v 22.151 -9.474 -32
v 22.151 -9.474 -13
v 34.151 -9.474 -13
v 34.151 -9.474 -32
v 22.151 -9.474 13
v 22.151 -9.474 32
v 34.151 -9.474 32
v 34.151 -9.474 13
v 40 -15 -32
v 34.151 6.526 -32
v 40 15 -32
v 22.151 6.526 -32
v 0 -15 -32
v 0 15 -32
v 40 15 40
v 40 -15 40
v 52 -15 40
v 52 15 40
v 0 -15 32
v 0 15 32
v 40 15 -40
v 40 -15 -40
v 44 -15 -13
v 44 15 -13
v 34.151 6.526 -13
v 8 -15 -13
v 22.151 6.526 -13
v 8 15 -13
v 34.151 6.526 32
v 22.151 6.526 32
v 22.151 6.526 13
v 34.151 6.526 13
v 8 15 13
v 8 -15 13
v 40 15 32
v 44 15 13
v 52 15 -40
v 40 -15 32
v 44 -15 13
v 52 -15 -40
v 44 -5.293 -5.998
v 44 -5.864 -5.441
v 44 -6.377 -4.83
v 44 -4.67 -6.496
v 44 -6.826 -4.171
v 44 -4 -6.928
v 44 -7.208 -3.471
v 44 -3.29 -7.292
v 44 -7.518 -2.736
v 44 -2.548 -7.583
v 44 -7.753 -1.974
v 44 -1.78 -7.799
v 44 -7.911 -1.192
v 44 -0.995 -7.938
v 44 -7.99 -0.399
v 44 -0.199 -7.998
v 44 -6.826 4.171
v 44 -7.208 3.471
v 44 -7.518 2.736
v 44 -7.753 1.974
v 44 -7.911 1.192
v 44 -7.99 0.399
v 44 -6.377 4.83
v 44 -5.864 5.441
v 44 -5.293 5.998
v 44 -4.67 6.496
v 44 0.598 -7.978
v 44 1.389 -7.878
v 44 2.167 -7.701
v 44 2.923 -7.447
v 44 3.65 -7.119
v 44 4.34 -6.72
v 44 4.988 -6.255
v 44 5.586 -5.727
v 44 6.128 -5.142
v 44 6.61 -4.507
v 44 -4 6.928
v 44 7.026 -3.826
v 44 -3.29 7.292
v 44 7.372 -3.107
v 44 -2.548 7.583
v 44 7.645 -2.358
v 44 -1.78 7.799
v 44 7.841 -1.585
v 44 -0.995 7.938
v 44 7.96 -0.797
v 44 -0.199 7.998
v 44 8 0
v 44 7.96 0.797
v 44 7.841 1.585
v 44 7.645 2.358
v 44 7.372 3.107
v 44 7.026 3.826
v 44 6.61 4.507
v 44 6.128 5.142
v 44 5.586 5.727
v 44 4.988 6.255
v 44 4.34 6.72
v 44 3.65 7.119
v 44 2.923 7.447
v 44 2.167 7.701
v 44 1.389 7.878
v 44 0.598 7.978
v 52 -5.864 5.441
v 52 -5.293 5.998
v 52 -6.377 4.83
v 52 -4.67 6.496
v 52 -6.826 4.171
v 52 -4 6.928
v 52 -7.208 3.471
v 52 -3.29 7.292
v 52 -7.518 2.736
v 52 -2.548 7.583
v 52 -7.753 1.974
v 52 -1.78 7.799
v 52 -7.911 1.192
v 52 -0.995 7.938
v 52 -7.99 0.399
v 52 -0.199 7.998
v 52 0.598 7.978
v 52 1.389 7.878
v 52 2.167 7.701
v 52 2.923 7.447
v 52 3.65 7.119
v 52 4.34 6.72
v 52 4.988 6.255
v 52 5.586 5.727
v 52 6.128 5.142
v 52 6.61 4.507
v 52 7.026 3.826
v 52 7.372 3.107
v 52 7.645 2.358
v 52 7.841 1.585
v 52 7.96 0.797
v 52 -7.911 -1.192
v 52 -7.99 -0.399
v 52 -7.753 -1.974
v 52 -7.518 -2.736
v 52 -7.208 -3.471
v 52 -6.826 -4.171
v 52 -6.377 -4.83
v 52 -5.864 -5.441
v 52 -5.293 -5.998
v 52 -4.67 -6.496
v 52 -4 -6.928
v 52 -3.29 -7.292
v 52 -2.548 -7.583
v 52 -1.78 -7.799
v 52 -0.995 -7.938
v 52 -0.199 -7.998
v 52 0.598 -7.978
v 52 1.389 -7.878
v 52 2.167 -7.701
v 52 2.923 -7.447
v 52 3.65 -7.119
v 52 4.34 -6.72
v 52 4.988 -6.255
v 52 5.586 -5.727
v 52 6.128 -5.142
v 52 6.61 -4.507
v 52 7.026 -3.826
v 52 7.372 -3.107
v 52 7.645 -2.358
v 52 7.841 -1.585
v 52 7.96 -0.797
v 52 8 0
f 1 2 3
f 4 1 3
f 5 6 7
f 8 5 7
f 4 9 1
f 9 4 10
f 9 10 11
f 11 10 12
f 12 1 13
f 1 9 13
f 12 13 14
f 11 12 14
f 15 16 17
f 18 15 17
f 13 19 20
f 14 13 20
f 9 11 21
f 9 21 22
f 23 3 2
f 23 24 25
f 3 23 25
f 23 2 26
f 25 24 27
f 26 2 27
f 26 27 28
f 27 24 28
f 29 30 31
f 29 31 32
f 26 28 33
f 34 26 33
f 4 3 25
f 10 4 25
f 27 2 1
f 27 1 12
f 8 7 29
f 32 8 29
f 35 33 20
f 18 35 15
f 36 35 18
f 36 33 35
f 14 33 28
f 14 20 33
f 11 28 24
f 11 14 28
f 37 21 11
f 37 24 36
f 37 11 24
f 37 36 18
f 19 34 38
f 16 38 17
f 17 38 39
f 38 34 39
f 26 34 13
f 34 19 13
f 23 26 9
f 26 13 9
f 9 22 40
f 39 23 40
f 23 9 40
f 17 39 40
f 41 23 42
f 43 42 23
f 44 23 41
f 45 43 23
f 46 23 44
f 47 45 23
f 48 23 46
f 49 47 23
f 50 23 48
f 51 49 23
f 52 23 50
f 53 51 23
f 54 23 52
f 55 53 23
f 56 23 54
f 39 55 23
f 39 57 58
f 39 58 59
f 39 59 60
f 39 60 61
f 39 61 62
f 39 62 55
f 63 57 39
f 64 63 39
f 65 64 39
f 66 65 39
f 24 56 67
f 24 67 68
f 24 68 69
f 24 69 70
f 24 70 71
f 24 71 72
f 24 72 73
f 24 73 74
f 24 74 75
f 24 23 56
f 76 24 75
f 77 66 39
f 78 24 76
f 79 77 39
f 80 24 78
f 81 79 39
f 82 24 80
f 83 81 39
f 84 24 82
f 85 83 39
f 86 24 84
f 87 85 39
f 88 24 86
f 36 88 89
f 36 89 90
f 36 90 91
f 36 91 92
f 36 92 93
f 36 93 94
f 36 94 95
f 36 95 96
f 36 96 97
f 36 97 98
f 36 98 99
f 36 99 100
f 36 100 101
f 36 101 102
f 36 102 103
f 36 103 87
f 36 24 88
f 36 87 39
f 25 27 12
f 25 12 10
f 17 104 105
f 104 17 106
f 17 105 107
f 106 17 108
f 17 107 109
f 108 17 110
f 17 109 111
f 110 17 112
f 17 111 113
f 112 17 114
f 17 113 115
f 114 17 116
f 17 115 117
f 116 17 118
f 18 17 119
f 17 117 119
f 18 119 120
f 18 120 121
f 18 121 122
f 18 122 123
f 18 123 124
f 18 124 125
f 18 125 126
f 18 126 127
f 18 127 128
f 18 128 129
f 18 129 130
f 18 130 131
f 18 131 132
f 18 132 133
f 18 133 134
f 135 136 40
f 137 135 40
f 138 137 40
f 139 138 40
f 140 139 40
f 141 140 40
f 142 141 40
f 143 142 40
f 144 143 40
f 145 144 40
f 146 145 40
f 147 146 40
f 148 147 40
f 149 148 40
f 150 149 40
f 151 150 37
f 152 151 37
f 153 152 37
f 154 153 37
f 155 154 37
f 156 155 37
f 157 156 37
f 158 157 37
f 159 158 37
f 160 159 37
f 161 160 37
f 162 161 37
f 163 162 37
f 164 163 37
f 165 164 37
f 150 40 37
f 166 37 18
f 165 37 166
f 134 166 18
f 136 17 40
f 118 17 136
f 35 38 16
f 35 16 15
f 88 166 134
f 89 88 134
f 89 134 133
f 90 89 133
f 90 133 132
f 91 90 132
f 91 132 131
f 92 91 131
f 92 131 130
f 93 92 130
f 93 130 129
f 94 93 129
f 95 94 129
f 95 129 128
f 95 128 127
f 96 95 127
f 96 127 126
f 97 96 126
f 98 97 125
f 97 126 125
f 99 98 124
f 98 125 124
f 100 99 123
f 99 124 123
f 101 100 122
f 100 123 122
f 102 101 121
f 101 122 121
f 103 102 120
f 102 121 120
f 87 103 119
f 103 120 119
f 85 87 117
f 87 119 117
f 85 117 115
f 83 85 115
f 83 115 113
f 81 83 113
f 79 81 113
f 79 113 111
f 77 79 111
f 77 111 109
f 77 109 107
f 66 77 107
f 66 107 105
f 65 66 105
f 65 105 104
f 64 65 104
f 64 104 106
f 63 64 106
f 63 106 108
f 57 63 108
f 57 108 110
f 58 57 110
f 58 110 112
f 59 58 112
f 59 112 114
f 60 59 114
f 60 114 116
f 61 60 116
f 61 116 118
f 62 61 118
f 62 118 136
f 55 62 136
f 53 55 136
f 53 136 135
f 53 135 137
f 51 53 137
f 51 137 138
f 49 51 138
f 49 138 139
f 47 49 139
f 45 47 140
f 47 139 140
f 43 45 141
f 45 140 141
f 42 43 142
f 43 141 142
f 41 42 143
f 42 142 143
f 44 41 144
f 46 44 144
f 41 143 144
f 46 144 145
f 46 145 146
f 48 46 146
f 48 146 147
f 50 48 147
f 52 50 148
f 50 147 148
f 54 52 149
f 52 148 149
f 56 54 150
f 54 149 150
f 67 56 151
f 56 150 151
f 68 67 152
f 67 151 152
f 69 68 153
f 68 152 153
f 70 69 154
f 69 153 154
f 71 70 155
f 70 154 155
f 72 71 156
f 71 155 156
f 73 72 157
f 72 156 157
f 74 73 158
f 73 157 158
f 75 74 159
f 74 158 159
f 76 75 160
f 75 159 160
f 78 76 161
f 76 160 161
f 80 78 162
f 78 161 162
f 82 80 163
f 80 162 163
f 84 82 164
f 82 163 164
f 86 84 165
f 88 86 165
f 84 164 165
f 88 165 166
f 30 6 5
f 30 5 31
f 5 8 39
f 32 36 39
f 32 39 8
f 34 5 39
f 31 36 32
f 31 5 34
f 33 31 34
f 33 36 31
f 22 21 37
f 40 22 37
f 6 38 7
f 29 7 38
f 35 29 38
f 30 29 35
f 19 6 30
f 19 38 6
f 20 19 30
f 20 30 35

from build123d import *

# Parameters (mm, degrees)
F0_W      = 30
F0_H      = 64
F1_DEPTH  = 52
F2_W      = 36
F2_H      = 26
F3_DEPTH  = 100
F4_W      = 12
F4_H      = 30
F5_DEPTH  = 8
F6_W      = 12
F6_H      = 30
F7_DEPTH  = 8
F8_R      = 8
F9_DEPTH  = 10
F11_W     = 12
F11_H     = 16
F12_DEPTH = 100


with BuildPart() as f1:
    # F0 (on Right) → F1 (new body)
    with BuildSketch(Plane.YZ):
        Rectangle(F0_W, F0_H)
    extrude(amount=F1_DEPTH)

    # F2 (on face) → F3 (cut)
    with BuildSketch(Plane(origin=(0, 15, 0), x_dir=(-1, 0, 0), z_dir=(0, 1, 0))):
        with Locations((-26, 0)):
            Rectangle(F2_W, F2_H)
    extrude(amount=-F3_DEPTH, mode=Mode.SUBTRACT)

    # F4 (on face) → F5 (join)
    with BuildSketch(Plane(origin=(0, 0, -32), x_dir=(1, 0, 0), z_dir=(0, 0, -1))):
        with Locations((46, 0)):
            Rectangle(F4_W, F4_H)
    extrude(amount=F5_DEPTH)

    # F6 (on face) → F7 (join)
    with BuildSketch(Plane.XY.offset(32)):
        with Locations((46, 0)):
            Rectangle(F6_W, F6_H)
    extrude(amount=F7_DEPTH)

    # F8 (on face) → F9 (cut)
    with BuildSketch(Plane.YZ.offset(52)):
        Circle(F8_R)
    extrude(amount=-F9_DEPTH, mode=Mode.SUBTRACT)

    # F11 (on face) → F12 (cut)
    with BuildSketch(Plane.XY.offset(32)):
        with Locations((28.151316, -1.473685)):
            Rectangle(F11_W, F11_H)
    extrude(amount=-F12_DEPTH, mode=Mode.SUBTRACT)


solid = f1.part
